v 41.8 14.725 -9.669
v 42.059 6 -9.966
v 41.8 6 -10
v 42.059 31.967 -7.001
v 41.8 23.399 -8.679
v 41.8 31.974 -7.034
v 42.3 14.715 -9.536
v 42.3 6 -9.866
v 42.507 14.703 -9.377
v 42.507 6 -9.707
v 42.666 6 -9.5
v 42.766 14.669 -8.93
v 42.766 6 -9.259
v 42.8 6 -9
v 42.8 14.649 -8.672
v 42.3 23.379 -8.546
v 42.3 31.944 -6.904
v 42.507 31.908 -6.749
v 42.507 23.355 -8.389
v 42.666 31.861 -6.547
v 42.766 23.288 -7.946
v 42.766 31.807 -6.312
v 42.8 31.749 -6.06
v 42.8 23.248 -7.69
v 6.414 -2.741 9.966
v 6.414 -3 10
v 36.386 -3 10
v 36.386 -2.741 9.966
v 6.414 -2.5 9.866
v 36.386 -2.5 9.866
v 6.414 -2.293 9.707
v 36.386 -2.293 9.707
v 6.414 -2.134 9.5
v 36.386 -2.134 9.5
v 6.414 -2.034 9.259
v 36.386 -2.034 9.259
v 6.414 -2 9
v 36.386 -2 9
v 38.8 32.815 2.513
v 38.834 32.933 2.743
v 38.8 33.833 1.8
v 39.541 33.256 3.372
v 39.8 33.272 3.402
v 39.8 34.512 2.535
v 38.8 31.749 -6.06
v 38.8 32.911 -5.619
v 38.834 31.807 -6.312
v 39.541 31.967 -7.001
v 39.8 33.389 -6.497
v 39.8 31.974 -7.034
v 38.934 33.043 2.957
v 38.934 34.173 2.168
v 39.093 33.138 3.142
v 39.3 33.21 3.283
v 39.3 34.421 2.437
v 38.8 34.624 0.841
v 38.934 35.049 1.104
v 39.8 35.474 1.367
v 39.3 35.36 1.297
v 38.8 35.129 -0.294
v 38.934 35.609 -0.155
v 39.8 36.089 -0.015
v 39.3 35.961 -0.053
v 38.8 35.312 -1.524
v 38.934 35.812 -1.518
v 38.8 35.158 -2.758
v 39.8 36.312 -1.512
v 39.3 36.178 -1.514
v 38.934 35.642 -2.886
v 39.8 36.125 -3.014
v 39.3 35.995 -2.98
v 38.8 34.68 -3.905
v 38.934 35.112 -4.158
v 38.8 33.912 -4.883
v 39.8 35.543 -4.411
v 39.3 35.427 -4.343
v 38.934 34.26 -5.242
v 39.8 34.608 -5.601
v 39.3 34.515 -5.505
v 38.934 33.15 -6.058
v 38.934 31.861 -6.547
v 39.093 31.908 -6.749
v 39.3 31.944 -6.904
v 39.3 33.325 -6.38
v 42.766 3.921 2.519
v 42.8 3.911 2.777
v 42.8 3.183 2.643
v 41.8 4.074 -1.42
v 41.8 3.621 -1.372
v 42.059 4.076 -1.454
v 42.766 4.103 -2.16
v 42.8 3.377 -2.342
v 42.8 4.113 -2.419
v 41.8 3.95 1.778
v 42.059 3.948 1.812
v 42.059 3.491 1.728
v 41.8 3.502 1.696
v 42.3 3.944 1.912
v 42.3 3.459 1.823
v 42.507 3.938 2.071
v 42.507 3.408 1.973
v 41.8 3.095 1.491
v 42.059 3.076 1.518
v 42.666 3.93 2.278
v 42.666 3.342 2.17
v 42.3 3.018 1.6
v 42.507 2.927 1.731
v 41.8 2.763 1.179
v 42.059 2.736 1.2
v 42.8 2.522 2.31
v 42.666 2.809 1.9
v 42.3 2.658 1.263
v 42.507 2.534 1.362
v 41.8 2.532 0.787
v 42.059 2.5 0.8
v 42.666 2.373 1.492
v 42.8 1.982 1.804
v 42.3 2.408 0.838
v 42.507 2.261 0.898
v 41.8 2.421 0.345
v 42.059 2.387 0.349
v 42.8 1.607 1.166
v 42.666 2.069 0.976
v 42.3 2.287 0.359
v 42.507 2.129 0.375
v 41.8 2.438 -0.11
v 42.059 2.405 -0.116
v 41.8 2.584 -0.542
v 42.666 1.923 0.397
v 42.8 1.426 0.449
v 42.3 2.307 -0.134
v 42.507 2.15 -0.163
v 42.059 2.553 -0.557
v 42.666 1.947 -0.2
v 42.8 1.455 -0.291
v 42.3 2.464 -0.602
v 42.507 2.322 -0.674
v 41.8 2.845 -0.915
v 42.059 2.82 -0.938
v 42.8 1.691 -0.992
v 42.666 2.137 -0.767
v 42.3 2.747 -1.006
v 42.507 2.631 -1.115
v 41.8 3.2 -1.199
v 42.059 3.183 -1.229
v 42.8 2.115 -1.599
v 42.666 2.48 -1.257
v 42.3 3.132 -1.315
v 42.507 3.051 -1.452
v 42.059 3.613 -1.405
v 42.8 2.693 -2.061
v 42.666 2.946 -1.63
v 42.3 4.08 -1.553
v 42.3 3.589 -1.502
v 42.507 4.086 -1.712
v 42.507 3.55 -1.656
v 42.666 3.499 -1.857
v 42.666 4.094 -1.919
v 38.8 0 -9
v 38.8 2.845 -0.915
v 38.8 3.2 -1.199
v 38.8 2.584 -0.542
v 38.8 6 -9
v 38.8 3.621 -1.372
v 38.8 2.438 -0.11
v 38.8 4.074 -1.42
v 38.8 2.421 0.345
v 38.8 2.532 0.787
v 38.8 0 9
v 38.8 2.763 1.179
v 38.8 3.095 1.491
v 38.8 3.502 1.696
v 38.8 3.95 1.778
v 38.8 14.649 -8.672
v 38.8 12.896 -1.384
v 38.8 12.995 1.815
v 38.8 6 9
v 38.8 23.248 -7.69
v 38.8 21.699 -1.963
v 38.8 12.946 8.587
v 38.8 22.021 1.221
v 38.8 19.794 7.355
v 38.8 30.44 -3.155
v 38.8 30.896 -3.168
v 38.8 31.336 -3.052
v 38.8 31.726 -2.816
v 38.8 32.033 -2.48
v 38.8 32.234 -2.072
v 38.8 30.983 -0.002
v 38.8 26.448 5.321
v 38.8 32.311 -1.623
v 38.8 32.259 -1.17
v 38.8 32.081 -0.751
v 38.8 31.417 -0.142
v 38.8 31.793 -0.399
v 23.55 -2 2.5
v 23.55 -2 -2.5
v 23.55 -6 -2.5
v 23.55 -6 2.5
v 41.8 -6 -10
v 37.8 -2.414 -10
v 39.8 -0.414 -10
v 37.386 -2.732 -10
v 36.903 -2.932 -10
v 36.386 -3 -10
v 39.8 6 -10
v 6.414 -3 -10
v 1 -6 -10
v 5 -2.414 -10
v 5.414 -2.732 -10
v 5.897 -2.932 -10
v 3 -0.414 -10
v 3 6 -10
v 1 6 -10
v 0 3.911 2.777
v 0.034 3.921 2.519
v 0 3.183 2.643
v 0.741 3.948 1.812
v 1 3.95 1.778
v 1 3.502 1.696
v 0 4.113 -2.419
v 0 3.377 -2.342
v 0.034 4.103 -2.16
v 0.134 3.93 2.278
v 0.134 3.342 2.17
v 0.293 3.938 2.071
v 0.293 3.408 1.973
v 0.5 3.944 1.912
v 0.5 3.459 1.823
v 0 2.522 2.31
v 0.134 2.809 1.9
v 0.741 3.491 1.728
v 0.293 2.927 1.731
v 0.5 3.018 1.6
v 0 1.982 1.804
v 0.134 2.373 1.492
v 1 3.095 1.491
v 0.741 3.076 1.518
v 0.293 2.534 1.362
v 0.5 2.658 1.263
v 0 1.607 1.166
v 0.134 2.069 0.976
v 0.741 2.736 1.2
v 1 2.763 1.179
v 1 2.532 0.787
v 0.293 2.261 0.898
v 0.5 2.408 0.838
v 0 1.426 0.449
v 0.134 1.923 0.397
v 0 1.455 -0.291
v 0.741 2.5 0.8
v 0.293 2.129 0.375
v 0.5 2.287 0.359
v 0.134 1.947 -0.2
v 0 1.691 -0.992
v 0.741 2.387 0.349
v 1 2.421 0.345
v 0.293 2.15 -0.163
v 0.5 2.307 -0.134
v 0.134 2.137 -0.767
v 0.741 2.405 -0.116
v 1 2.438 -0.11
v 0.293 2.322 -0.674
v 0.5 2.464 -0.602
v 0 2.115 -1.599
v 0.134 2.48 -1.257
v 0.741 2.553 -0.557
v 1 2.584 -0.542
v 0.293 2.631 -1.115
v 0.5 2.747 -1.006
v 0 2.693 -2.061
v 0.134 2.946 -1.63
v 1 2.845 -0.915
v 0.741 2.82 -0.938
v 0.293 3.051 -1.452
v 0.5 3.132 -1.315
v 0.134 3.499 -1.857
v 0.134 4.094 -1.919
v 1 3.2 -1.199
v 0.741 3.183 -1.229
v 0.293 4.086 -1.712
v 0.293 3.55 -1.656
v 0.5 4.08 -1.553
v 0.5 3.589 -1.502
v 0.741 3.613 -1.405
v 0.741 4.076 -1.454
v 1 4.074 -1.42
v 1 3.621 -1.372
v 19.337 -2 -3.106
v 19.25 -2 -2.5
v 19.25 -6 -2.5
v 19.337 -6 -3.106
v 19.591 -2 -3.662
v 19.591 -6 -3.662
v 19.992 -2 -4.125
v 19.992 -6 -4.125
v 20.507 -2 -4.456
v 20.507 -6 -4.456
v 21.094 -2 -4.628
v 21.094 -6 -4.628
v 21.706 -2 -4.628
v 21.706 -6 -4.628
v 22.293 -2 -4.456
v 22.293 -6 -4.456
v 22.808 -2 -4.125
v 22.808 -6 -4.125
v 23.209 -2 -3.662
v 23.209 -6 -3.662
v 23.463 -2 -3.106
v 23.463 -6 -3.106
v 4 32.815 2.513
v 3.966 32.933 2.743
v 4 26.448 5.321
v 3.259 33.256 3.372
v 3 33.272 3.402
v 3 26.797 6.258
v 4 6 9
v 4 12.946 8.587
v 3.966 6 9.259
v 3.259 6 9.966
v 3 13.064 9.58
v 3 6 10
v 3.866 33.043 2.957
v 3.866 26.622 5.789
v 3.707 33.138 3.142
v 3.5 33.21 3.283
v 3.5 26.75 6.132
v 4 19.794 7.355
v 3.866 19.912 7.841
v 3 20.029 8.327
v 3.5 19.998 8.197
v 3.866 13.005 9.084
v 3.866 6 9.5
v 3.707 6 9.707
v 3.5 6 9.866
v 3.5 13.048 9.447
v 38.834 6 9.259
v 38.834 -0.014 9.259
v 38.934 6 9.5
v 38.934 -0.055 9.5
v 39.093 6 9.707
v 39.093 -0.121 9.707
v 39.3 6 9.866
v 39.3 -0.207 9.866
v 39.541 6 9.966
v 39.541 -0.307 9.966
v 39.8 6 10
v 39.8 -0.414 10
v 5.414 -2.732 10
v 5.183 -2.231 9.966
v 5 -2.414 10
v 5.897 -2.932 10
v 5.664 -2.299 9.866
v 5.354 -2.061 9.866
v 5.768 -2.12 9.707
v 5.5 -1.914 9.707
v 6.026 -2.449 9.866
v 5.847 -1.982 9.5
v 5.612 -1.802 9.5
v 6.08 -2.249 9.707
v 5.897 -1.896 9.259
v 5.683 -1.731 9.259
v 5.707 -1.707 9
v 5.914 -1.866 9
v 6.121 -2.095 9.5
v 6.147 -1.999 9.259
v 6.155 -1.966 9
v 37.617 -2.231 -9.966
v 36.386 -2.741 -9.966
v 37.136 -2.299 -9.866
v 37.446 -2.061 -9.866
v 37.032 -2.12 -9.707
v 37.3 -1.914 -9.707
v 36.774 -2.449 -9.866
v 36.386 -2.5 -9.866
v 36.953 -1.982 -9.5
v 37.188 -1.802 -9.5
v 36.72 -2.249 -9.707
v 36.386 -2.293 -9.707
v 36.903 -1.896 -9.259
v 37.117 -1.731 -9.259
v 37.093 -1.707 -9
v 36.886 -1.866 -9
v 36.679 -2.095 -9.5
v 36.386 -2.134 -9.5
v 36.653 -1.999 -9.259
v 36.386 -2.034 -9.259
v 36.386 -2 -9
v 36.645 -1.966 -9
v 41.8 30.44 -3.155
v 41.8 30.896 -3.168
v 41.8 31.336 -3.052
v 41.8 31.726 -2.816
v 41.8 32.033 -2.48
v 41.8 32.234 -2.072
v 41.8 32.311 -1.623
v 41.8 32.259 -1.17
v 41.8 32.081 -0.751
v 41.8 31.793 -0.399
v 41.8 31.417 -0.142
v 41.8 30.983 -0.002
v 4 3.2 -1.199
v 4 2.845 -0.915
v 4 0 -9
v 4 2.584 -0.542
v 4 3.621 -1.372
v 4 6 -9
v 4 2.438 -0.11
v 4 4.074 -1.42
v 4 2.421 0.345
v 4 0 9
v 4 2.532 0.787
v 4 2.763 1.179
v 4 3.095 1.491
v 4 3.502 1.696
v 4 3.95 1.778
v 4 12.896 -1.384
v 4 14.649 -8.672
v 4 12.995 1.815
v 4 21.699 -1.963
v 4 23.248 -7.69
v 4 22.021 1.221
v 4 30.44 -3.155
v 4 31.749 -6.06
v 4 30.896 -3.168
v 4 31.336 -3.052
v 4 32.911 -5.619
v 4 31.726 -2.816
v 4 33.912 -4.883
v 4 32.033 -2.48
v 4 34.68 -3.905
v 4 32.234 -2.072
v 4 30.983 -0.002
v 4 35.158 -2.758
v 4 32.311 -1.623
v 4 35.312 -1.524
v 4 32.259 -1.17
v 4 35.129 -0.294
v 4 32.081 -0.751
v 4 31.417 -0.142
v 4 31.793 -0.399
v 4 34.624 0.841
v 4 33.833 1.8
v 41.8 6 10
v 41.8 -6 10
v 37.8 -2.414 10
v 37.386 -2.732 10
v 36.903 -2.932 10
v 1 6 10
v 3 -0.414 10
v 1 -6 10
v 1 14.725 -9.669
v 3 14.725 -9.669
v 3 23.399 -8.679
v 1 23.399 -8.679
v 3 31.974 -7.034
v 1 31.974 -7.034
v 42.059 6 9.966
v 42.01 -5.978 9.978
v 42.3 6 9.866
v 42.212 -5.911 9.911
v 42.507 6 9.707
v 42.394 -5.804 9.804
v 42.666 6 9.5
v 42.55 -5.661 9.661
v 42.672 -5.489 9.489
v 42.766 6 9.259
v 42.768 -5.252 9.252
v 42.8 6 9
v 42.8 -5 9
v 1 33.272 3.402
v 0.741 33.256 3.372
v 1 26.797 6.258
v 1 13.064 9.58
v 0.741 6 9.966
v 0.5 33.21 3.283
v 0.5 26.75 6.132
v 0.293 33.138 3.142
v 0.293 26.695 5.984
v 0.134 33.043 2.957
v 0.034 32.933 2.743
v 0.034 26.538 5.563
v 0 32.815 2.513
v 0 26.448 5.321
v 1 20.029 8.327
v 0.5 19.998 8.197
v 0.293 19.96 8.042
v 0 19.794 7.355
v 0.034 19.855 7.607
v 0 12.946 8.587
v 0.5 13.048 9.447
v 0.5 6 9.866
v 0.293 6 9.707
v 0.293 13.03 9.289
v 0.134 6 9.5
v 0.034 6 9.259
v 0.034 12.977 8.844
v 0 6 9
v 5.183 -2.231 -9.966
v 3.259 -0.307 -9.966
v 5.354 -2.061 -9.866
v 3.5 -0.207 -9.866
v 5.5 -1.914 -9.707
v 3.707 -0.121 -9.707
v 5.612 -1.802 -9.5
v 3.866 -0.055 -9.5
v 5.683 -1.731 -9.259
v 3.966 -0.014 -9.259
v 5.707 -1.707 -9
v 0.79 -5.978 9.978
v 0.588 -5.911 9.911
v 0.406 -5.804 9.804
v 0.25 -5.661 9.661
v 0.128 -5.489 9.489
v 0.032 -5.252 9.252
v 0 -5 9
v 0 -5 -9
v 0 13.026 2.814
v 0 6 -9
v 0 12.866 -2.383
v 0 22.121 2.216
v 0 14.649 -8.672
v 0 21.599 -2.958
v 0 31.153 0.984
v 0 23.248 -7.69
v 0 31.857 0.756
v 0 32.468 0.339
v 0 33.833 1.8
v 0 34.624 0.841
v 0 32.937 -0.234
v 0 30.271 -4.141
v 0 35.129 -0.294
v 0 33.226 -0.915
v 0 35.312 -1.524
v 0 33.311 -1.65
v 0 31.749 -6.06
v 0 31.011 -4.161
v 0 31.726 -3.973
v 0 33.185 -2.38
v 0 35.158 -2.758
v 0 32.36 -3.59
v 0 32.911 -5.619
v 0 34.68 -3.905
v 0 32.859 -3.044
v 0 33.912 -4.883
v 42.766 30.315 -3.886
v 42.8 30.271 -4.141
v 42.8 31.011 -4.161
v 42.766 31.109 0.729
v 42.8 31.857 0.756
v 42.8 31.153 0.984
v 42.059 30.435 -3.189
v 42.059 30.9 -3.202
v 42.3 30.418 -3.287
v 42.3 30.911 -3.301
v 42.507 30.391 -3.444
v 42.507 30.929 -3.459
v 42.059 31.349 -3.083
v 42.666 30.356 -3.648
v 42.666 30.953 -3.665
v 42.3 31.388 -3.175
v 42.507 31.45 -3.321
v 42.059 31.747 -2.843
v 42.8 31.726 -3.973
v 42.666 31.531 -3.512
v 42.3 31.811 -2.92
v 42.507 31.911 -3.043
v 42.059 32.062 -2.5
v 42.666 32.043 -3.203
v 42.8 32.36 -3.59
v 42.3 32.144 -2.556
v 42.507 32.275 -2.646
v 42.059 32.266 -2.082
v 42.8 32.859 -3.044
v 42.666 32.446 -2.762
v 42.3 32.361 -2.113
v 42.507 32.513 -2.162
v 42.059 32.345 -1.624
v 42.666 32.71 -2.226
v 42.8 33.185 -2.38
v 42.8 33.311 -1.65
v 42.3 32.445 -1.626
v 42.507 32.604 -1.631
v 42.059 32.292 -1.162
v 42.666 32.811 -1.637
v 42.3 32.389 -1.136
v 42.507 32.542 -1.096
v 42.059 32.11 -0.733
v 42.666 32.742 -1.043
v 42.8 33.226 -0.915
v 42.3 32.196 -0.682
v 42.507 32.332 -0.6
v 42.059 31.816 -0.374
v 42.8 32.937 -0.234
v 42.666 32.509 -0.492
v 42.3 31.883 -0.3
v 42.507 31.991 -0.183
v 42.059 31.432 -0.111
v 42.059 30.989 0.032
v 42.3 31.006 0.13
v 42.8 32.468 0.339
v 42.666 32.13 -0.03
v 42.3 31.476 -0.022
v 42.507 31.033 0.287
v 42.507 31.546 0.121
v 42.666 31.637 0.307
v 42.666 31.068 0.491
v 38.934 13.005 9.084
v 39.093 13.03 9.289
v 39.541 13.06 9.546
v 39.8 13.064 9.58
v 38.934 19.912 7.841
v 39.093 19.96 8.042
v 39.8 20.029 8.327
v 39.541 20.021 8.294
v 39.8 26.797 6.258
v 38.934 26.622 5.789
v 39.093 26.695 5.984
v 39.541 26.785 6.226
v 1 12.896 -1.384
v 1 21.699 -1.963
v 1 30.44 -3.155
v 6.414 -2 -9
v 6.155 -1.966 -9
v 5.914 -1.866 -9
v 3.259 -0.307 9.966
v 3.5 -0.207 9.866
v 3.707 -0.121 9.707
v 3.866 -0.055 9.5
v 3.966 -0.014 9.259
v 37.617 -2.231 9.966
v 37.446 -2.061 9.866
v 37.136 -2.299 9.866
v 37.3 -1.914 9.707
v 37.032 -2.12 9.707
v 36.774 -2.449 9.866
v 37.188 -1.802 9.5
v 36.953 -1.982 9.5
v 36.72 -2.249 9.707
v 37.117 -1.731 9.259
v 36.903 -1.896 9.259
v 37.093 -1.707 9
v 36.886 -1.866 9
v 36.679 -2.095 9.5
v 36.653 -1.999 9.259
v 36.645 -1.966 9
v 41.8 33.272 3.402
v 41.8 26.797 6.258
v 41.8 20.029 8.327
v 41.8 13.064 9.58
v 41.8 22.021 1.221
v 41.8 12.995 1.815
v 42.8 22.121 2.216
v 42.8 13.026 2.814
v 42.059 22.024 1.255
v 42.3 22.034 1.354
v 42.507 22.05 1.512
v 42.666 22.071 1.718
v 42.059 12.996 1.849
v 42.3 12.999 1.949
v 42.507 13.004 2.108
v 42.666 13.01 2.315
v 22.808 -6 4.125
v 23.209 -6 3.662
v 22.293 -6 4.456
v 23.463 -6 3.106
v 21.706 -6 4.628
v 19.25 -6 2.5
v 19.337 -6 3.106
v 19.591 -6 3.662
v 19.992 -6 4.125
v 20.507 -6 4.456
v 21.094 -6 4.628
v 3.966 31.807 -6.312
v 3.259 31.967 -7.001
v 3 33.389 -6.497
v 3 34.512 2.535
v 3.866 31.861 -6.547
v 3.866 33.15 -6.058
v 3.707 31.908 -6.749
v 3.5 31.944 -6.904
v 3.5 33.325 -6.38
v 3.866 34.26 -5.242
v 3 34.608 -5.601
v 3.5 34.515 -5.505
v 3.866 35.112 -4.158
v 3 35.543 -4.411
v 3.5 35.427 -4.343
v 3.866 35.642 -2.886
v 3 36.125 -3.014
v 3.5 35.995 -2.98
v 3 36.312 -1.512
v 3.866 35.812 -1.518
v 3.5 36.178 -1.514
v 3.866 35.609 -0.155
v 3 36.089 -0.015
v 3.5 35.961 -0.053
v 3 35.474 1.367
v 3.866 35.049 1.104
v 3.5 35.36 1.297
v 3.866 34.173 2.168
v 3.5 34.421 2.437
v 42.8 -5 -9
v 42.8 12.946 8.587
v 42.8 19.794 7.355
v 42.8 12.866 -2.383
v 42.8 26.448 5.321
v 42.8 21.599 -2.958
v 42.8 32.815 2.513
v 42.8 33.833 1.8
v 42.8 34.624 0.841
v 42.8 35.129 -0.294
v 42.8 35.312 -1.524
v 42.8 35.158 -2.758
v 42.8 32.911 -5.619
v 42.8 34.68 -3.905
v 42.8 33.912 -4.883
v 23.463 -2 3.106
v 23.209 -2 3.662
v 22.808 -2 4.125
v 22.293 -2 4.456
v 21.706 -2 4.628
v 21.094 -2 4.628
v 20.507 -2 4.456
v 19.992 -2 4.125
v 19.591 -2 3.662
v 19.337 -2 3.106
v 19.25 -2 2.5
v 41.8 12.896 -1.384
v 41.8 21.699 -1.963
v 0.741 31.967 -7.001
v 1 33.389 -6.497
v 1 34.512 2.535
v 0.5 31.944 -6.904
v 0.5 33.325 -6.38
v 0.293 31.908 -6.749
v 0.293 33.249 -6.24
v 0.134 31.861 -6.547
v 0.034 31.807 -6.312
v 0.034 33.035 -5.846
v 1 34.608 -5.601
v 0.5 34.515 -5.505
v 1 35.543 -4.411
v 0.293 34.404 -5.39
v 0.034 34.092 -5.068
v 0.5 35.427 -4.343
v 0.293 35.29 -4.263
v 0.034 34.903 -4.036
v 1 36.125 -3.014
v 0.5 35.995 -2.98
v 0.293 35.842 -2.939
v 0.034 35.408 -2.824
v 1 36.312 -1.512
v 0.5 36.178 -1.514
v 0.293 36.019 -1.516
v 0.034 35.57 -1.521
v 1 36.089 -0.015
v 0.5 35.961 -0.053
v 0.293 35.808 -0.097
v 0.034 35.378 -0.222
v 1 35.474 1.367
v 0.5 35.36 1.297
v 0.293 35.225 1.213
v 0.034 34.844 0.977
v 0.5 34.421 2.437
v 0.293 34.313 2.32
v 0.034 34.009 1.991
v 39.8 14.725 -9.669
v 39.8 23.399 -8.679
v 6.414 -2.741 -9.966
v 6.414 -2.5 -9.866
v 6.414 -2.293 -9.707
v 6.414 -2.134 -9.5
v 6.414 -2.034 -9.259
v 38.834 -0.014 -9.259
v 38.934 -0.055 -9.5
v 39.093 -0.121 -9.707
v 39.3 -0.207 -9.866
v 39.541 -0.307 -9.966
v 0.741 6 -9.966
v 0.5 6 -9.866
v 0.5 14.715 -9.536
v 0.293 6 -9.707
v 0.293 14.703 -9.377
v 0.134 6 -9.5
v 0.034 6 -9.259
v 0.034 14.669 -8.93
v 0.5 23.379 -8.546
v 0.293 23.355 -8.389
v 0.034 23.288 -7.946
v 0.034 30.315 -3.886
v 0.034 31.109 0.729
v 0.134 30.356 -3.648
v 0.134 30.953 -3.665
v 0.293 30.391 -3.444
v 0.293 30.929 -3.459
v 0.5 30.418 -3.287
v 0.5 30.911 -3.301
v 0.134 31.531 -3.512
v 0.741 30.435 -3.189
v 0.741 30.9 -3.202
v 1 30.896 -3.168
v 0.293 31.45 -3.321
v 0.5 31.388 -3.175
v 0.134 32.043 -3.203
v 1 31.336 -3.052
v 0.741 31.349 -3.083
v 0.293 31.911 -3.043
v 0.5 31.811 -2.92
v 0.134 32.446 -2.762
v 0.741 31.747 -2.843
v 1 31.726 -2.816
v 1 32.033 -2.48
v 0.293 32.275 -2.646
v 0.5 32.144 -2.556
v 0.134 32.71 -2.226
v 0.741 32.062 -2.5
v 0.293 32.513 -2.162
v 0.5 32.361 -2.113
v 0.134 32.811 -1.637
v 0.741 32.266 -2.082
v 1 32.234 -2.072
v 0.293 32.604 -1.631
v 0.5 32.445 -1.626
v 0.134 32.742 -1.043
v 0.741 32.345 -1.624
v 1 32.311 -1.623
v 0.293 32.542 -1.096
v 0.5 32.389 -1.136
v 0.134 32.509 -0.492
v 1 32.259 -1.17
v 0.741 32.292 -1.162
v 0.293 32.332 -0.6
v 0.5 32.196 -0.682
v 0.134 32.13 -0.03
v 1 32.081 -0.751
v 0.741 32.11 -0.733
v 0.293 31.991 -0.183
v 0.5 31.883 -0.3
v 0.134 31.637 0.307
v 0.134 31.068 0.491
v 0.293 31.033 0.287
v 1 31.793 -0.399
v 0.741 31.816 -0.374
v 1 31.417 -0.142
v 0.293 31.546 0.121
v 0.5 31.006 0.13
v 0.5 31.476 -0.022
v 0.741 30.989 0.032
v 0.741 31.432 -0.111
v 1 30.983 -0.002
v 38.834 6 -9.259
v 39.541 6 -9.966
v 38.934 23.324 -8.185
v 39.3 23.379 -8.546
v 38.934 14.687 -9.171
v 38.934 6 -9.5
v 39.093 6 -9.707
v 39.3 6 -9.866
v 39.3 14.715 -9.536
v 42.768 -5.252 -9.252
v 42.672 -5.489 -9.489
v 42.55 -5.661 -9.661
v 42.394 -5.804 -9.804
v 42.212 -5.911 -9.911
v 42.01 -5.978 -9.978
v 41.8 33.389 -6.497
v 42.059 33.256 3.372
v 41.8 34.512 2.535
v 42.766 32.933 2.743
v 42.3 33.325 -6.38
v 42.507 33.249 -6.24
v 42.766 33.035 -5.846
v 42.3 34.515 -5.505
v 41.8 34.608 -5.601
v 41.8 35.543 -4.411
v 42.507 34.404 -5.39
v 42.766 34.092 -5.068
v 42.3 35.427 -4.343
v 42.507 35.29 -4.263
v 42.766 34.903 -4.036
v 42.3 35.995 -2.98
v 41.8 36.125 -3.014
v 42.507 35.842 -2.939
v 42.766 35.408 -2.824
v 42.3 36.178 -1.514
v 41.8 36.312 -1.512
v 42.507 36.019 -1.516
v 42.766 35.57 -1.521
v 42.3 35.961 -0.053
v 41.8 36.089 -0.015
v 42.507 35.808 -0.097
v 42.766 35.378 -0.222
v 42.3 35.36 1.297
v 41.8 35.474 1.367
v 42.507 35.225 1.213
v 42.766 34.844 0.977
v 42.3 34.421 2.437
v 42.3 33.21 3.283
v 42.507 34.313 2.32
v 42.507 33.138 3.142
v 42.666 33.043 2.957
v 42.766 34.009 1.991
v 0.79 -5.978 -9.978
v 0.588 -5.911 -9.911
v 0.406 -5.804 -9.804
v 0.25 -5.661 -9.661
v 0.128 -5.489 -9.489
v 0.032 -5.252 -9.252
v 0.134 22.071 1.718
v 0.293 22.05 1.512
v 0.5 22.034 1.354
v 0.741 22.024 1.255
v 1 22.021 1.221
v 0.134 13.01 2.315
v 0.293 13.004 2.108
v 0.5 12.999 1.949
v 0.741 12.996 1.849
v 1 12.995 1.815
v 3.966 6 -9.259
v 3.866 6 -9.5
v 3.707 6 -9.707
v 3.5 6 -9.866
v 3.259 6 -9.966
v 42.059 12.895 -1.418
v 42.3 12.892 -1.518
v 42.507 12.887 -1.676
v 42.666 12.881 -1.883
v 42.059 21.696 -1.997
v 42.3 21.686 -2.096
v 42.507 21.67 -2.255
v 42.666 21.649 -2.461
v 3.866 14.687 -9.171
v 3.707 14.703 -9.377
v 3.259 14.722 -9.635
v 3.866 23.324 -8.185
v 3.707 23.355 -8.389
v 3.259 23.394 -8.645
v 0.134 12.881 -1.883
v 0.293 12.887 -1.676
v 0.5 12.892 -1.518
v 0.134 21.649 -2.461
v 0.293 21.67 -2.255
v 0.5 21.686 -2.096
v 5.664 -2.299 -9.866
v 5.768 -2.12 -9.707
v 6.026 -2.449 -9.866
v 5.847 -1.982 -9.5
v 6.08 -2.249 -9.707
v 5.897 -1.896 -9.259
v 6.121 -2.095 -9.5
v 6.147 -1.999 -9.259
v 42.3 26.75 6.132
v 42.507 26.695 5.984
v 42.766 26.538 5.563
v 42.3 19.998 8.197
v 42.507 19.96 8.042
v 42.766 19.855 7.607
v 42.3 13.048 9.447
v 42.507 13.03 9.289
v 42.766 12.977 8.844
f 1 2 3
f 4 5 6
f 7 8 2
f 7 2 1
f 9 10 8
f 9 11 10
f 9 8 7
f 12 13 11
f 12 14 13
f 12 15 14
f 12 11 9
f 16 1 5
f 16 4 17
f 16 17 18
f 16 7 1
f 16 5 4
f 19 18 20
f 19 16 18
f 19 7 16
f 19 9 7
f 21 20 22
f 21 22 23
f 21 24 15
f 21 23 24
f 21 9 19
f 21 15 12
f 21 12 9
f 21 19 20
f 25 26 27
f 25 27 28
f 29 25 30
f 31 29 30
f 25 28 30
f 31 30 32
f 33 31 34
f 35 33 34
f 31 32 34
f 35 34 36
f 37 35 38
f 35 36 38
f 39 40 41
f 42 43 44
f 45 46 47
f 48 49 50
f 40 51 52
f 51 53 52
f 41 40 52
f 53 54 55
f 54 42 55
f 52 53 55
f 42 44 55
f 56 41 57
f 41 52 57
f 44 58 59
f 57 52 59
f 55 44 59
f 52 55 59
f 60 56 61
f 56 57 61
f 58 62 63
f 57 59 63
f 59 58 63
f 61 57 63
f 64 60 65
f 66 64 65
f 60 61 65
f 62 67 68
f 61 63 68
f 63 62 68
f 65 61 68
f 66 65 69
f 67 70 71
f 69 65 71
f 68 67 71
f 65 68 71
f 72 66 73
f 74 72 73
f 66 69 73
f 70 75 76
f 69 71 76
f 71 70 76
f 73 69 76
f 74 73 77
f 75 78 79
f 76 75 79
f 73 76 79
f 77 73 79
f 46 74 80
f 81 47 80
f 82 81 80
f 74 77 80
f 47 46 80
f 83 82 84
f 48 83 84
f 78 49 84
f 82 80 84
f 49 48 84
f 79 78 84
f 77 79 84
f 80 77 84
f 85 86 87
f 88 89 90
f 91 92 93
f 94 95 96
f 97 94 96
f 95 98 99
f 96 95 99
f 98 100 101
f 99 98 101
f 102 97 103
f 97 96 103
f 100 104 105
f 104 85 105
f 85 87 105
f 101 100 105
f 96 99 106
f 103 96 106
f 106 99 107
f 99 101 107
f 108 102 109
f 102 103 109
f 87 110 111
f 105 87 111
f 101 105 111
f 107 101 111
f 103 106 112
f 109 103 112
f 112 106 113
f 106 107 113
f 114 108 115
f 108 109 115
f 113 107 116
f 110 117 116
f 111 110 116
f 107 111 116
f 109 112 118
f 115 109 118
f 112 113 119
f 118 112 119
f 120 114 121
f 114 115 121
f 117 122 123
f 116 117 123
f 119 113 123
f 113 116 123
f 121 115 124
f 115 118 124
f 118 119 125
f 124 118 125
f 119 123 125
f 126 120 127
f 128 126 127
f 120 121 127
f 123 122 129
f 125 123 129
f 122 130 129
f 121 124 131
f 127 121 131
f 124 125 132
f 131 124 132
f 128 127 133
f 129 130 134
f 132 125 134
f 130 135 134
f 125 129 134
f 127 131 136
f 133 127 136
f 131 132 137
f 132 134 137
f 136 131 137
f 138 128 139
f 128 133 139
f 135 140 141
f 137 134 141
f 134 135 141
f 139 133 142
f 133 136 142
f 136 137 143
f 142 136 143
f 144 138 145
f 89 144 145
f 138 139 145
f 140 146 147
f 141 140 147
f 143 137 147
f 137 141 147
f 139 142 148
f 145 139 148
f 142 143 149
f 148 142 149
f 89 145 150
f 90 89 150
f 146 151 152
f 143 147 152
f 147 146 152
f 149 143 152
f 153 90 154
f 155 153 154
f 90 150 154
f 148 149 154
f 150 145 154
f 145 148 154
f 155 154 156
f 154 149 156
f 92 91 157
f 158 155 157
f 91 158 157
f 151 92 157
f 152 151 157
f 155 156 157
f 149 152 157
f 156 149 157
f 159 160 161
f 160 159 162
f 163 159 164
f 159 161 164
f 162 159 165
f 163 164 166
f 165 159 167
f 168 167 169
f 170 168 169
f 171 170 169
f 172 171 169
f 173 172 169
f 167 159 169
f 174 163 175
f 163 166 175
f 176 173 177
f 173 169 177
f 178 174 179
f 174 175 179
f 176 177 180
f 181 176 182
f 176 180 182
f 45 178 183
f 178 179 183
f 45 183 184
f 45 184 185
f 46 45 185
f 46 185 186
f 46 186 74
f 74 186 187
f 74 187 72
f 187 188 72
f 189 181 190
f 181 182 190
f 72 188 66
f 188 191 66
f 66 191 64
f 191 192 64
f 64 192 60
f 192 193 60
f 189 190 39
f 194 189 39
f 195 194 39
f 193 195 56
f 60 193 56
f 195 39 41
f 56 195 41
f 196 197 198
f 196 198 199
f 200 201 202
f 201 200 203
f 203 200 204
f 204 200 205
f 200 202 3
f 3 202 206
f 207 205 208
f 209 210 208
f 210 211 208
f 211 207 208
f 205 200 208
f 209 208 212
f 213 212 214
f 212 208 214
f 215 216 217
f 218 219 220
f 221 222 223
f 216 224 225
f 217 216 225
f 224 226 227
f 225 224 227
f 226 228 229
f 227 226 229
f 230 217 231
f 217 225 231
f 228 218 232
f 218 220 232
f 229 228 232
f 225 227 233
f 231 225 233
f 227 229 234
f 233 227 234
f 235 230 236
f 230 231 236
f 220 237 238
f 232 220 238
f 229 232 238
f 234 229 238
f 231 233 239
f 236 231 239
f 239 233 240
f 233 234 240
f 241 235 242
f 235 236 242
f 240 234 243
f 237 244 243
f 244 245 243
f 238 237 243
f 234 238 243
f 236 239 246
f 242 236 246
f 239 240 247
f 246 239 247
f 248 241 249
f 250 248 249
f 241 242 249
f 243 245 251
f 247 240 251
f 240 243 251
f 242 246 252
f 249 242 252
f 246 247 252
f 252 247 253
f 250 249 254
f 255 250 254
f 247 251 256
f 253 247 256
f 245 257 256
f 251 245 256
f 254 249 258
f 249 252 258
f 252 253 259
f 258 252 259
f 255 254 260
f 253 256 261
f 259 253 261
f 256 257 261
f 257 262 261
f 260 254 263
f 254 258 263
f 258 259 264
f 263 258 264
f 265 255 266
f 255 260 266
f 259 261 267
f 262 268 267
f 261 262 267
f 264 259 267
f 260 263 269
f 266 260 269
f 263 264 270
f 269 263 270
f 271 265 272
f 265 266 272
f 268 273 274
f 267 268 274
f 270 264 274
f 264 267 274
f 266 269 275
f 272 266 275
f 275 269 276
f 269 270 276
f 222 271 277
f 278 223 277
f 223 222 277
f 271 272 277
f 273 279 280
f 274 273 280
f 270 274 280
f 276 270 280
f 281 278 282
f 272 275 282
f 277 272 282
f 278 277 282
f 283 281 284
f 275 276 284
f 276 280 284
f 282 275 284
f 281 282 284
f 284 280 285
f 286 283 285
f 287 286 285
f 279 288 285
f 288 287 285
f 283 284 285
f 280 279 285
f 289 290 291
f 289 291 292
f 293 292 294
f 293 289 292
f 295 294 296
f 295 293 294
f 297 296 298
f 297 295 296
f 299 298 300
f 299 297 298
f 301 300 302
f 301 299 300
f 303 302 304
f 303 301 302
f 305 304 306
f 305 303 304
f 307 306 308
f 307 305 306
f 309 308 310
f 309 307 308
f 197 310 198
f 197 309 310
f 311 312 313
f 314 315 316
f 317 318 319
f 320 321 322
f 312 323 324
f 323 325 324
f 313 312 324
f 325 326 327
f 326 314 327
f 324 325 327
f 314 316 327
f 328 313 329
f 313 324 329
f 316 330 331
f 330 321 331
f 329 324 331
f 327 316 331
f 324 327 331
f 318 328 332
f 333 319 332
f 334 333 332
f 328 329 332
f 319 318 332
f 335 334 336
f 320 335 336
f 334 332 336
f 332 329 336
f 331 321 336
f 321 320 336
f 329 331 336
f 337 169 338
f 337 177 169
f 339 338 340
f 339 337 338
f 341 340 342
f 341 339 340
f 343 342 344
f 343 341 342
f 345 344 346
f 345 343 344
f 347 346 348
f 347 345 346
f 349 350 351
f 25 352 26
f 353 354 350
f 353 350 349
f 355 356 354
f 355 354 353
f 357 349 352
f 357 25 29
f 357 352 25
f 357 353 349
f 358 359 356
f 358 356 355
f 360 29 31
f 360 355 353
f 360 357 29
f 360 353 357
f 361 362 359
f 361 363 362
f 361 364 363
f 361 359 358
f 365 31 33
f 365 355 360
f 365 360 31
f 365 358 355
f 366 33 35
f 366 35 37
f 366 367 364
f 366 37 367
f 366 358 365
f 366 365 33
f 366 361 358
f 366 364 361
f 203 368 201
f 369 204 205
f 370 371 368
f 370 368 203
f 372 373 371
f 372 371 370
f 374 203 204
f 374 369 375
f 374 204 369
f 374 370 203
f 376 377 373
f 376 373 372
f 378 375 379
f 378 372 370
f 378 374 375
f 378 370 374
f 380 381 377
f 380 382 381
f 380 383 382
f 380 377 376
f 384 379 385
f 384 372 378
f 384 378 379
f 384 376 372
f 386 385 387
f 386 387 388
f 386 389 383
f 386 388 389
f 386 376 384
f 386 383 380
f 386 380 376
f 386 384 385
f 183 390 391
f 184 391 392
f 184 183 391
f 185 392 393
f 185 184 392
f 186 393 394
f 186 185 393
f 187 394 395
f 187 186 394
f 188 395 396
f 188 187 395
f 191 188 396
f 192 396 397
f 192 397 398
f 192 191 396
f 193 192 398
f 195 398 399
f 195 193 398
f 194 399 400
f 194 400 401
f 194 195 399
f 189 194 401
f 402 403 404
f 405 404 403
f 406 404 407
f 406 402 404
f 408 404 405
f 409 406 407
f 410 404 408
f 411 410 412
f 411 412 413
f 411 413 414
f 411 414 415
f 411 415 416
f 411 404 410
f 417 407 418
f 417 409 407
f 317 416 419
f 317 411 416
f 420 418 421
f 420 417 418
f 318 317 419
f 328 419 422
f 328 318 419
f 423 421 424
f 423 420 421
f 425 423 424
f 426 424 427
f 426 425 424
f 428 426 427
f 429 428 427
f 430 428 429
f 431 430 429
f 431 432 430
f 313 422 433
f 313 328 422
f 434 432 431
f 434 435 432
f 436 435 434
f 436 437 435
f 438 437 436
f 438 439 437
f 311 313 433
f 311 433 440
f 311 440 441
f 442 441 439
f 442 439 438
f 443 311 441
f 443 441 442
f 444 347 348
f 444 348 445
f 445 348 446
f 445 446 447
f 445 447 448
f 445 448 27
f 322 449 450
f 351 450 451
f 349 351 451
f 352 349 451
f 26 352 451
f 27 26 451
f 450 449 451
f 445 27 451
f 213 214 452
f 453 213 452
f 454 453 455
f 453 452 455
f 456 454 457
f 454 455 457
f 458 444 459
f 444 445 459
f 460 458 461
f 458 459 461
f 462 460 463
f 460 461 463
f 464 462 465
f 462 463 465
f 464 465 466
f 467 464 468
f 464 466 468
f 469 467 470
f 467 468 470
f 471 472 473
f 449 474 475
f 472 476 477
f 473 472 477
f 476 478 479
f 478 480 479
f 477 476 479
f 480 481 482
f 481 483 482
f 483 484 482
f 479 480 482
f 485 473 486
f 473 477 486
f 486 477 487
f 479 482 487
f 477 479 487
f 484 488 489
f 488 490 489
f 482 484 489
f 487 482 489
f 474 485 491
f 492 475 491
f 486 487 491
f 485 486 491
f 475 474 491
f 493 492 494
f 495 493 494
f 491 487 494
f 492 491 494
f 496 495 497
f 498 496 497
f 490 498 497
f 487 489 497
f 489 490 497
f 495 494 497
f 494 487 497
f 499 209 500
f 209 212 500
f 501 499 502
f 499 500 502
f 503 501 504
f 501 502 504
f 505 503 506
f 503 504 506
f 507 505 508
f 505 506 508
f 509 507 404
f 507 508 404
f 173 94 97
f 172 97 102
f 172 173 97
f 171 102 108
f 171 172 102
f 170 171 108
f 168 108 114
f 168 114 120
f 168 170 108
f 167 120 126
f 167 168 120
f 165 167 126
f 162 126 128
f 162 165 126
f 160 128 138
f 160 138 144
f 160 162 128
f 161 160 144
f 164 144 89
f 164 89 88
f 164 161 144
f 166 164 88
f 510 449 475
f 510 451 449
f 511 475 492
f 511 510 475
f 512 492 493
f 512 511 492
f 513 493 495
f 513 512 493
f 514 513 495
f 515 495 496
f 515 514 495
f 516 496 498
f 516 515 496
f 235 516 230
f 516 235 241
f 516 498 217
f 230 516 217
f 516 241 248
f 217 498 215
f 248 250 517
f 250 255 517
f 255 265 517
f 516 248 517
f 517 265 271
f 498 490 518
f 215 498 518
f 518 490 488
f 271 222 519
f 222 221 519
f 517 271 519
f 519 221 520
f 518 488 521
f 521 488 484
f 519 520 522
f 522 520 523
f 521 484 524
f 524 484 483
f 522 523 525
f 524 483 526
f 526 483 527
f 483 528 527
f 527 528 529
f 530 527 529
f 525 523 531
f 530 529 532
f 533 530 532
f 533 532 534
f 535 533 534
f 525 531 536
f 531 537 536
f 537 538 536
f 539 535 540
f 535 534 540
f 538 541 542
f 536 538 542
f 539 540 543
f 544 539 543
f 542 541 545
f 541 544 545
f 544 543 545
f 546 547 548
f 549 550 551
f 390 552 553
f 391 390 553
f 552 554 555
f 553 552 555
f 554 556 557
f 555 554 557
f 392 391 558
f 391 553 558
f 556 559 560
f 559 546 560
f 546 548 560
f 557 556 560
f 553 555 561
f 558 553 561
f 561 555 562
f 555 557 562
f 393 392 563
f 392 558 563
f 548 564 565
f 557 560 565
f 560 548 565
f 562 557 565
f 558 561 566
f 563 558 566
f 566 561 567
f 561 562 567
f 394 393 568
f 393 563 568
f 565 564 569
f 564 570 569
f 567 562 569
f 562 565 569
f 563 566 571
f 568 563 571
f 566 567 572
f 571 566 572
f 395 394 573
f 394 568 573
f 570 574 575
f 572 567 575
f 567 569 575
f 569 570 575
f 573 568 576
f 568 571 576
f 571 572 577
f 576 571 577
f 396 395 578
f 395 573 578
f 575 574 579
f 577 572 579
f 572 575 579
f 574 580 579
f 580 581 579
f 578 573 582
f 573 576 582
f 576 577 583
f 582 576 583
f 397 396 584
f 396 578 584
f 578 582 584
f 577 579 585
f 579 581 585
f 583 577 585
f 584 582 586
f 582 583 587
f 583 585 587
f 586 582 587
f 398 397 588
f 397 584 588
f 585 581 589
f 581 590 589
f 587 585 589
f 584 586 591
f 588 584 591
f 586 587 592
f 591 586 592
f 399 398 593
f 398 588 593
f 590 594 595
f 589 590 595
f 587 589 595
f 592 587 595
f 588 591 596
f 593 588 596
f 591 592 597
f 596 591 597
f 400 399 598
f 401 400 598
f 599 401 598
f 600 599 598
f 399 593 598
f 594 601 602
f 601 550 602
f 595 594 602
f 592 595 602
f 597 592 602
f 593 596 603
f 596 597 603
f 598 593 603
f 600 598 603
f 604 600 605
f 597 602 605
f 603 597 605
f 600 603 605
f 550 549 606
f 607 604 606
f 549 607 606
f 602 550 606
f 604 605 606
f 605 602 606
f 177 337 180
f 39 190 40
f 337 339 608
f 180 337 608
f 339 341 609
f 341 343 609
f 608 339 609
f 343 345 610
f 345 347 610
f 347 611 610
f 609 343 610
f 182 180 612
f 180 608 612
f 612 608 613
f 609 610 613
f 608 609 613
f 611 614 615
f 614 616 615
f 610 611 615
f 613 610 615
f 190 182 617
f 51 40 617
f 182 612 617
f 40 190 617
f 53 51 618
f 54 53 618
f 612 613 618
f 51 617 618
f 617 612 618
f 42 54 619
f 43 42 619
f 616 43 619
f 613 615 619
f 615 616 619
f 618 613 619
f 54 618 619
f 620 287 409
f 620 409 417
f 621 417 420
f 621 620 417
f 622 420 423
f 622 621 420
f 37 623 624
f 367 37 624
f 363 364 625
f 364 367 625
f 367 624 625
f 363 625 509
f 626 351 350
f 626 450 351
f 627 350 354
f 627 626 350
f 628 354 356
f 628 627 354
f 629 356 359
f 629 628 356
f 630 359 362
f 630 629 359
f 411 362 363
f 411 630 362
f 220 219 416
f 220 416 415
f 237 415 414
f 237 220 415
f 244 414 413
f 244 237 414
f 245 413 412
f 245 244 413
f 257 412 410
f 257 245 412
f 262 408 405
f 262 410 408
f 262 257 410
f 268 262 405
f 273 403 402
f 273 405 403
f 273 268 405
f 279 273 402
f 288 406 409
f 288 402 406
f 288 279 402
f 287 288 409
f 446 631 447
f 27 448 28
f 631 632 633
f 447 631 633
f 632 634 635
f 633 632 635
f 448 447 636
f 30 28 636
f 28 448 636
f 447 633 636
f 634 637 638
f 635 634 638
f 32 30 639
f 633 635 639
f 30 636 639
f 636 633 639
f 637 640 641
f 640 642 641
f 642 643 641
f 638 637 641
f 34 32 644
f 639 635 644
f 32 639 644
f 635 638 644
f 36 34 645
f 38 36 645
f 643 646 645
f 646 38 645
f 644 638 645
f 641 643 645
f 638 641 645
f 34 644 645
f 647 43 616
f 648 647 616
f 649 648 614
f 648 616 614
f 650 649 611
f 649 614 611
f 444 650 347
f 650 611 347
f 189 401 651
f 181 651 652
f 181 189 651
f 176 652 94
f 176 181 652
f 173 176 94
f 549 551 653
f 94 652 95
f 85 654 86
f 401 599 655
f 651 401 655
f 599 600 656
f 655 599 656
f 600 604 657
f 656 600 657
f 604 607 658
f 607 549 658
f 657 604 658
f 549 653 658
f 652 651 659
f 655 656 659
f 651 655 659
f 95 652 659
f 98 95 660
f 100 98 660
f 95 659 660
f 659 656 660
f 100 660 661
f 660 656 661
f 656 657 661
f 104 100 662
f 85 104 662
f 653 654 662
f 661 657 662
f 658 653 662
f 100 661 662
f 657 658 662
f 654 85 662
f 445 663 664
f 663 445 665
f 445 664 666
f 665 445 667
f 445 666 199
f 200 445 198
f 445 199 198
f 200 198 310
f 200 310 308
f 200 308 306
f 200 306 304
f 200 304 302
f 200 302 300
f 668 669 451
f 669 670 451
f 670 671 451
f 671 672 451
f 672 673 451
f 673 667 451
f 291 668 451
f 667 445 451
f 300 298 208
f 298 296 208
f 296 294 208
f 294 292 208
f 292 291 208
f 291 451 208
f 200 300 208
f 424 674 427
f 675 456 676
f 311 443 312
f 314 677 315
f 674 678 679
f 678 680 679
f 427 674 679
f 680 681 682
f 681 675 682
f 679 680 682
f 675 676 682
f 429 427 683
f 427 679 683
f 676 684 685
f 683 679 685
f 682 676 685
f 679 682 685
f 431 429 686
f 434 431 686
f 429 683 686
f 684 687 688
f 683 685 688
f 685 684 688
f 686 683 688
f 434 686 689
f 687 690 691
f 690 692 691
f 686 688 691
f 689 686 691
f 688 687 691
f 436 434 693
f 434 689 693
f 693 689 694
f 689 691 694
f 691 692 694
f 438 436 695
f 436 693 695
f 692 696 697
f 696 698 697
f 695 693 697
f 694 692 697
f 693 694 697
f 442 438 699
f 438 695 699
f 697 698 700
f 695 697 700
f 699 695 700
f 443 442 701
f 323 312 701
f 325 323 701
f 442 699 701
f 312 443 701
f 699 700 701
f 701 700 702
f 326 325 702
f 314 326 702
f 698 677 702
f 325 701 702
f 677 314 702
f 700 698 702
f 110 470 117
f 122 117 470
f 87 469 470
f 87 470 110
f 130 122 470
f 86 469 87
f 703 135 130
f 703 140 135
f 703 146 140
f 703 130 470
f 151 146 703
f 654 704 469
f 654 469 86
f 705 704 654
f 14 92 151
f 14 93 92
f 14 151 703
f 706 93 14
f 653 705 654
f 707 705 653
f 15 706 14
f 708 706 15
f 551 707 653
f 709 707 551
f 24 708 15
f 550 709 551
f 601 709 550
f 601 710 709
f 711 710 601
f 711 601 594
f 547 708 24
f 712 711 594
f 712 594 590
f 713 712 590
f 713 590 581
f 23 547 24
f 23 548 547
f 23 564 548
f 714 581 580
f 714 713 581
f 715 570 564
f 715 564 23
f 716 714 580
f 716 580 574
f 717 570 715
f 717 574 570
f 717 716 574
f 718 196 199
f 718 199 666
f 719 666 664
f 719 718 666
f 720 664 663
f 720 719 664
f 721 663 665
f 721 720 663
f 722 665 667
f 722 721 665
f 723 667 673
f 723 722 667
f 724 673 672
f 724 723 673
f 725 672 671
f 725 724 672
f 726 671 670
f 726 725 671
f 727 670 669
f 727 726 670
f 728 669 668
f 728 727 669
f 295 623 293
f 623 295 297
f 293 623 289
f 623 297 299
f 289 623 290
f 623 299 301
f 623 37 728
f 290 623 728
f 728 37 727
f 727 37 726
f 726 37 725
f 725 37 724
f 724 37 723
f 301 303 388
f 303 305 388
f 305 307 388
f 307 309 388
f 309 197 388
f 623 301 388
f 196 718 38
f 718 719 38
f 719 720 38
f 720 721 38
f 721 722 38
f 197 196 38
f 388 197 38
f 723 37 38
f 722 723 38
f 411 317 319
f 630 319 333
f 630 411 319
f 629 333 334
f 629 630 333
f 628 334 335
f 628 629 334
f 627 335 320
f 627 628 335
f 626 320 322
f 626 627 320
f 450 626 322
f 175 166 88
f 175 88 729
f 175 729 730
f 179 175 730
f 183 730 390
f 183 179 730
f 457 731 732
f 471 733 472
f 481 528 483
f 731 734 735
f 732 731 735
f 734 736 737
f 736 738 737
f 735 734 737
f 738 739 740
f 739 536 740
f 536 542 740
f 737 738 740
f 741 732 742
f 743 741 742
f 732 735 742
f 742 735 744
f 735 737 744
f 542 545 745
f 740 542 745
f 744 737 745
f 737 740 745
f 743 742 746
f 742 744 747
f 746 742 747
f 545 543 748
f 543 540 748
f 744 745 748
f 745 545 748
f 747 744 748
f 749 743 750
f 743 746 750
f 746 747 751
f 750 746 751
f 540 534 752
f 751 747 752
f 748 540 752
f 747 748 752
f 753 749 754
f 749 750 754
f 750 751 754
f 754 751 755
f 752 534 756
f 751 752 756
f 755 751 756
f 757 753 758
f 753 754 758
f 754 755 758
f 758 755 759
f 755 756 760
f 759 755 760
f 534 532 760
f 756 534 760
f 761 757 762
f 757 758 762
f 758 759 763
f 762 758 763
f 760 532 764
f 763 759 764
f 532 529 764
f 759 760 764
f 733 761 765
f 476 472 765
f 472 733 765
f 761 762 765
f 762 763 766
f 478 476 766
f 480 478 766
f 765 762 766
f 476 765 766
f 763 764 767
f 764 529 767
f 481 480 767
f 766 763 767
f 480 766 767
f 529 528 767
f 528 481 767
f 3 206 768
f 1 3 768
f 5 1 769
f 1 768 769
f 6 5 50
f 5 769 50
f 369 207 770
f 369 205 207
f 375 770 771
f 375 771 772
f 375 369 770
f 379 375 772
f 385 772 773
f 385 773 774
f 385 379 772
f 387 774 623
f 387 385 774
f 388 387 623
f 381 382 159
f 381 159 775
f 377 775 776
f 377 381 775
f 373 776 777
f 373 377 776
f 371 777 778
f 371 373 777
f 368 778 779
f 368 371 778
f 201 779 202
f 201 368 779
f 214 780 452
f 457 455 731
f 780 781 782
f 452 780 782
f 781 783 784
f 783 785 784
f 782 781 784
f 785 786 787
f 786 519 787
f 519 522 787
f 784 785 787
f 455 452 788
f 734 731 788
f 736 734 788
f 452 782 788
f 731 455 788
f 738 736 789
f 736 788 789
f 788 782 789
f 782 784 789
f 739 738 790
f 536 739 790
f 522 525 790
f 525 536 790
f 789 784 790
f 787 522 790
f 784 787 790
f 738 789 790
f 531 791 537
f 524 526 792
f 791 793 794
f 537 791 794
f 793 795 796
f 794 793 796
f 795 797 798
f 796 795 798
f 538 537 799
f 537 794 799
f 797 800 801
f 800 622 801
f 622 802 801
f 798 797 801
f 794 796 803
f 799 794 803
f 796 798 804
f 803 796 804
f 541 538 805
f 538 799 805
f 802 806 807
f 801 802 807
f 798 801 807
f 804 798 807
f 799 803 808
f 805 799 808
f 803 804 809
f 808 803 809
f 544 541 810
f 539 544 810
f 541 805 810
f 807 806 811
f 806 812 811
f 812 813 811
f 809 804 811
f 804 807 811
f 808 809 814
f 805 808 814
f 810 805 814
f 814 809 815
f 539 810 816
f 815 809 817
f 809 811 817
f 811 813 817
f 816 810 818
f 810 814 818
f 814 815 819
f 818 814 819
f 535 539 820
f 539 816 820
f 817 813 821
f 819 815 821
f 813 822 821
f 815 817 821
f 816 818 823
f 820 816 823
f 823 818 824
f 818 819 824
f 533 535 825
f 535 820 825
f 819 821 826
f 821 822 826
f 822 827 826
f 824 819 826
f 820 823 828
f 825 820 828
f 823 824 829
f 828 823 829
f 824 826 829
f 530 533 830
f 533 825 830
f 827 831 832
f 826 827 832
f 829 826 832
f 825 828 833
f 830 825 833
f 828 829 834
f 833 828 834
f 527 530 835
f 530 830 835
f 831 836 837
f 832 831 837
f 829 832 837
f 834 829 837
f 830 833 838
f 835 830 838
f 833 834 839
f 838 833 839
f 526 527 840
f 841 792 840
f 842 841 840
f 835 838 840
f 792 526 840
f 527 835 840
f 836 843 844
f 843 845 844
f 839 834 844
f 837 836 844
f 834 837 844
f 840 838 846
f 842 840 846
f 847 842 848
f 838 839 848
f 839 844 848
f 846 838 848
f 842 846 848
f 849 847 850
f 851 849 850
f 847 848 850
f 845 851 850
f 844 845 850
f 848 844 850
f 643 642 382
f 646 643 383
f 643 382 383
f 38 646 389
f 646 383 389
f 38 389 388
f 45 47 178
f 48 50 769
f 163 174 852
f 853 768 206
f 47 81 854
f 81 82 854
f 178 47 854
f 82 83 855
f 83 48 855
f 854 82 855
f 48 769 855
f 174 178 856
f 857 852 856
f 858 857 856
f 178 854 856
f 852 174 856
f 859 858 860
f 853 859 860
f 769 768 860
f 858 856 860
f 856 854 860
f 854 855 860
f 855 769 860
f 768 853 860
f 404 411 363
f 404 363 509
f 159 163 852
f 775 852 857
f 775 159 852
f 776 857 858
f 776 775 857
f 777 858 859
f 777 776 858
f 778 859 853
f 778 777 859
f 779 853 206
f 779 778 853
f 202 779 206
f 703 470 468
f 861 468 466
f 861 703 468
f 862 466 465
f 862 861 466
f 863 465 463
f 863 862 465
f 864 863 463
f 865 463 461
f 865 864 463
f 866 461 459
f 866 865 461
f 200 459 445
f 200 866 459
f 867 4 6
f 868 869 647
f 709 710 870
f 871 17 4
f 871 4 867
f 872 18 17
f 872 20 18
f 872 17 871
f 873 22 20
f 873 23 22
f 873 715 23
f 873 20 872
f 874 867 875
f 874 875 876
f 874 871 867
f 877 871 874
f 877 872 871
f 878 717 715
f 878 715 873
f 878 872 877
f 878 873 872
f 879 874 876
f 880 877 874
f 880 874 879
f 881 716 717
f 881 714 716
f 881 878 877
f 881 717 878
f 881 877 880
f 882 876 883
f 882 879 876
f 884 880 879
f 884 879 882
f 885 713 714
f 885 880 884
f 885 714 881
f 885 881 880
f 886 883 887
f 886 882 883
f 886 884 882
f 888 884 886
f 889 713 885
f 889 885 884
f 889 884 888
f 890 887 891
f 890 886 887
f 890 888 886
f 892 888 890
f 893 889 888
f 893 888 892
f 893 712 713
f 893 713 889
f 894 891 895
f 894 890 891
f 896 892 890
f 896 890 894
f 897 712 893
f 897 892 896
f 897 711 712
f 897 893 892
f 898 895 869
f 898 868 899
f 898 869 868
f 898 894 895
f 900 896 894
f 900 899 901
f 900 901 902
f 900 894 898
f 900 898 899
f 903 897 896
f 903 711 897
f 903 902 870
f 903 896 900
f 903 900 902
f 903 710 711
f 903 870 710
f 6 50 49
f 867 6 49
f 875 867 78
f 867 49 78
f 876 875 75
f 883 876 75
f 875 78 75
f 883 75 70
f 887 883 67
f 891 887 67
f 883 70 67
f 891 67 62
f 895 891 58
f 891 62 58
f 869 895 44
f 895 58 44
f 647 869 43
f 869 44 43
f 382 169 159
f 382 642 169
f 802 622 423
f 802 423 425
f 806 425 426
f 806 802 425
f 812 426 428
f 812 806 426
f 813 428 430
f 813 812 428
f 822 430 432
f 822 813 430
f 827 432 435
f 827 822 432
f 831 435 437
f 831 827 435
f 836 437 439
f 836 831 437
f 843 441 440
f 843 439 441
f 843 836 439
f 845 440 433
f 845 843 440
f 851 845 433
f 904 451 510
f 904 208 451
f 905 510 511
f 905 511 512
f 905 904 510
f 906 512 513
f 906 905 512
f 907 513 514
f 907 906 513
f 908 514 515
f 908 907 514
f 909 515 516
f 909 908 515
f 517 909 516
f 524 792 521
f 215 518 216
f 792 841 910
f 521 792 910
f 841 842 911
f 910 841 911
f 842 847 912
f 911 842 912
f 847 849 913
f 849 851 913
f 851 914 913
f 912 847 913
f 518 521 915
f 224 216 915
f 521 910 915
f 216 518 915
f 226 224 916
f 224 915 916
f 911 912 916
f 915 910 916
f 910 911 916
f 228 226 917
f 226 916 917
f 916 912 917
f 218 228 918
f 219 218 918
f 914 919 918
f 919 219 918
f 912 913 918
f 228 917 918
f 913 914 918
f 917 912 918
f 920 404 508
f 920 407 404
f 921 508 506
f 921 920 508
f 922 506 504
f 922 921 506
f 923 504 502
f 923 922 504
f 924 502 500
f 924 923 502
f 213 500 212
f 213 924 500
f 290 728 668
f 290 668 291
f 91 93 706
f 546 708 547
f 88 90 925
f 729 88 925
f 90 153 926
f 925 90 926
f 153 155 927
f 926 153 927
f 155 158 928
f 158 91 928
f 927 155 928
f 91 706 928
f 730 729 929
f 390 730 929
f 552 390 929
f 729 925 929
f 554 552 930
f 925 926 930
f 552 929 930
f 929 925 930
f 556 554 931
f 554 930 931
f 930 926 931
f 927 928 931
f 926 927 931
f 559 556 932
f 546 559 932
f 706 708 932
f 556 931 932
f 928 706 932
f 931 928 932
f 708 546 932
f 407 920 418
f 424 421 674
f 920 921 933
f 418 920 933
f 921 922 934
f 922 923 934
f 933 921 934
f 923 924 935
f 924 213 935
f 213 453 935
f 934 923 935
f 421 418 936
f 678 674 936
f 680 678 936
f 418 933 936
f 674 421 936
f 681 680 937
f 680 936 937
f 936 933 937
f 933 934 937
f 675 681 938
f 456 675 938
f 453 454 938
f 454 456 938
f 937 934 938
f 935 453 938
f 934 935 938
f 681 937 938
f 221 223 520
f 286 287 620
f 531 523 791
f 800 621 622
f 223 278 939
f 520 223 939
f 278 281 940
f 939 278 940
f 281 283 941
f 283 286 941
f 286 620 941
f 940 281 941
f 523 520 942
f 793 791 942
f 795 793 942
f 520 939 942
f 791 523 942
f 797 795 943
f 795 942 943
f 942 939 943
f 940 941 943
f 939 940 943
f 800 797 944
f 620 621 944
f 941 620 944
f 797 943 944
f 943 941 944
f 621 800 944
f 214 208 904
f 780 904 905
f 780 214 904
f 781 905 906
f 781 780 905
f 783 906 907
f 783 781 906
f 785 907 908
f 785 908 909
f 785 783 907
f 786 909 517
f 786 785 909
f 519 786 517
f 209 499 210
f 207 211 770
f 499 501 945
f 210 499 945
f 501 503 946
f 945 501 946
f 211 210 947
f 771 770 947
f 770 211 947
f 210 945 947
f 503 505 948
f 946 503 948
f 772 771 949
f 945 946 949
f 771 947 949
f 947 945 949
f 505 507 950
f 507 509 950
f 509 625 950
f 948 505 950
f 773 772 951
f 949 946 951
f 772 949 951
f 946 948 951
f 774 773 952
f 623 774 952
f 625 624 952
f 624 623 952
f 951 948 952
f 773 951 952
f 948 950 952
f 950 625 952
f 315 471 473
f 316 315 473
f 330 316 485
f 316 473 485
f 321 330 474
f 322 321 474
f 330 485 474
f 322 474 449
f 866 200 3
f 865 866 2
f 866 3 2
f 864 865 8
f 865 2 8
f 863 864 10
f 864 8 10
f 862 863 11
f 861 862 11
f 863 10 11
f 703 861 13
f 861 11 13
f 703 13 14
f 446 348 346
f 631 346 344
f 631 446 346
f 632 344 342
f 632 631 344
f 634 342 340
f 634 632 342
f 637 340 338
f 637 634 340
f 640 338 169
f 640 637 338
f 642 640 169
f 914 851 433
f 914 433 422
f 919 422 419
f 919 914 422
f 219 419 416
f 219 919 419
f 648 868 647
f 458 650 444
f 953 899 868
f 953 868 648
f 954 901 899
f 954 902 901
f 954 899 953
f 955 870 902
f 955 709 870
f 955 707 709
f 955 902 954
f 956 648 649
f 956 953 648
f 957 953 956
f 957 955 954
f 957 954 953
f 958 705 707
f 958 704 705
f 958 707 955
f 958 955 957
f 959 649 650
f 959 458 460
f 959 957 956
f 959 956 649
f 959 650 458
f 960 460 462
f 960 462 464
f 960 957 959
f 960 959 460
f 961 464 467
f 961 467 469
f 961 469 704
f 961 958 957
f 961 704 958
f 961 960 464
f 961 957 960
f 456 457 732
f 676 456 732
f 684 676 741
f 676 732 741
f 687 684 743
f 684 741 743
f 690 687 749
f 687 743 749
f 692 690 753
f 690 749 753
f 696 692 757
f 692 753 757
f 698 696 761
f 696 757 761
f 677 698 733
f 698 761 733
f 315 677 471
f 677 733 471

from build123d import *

# Parameters (mm, degrees)
BOSS_EXTRUDE1_DEPTH = 42.8
SKETCH2_W           = 34.8
SKETCH2_H           = 38.311897311
CUT_EXTRUDE1_DEPTH  = 60.585181768
CHAMFER1_SIZE       = 2
FILLET1_R           = 1
CUT_EXTRUDE2_DEPTH  = 59.306444702


with BuildPart() as part:
    # Sketch1 → Boss-Extrude1 (new body)
    with BuildSketch(Plane(origin=(0, 0, 0), x_dir=(0, 0, -1), z_dir=(1, 0, 0))):
        with BuildLine():
            Line((-10, -6), (10, -6))
            Line((10, -6), (10, 6))
            ThreePointArc((10, 6), (9.25619767, 19.071476996), (7.034393072, 31.974202951))
            ThreePointArc((7.034393072, 31.974202951), (2.269388413, 36.269117533), (-3.402199146, 33.271676085))
            ThreePointArc((-3.402199146, 33.271676085), (-8.327095908, 20.029213205), (-10, 6))
            Line((-10, 6), (-10, -6))
        make_face()
        with BuildLine():
            ThreePointArc((0.001705571, 30.983312005), (-1.596543983, 17.513106187), (-1.778018244, 3.949628997))
            ThreePointArc((-1.778018244, 3.949628997), (-0.116879823, 2.413198345), (1.419550828, 4.074336766))
            ThreePointArc((1.419550828, 4.074336766), (1.596543983, 17.302893813), (3.15532829, 30.440482617))
            ThreePointArc((3.15532829, 30.440482617), (1.849931624, 32.288708671), (0.001705571, 30.983312005))
        make_face(mode=Mode.SUBTRACT)
    extrude(amount=BOSS_EXTRUDE1_DEPTH)

    # Sketch2 → Cut-Extrude1 (cut, through all)
    with BuildSketch(Plane.XY.offset(10)):
        with Locations((21.4, 17.155948656)):
            Rectangle(SKETCH2_W, SKETCH2_H)
    extrude(amount=-CUT_EXTRUDE1_DEPTH, mode=Mode.SUBTRACT)

    # Chamfer1
    chamfer1_edges = [part.edges().sort_by_distance(p)[0] for p in [
        (4, -2, 0),
        (38.8, -2, 0),
    ]]
    chamfer(chamfer1_edges, length=CHAMFER1_SIZE)

    # Fillet1
    fillet1_edges = [part.edges().sort_by_distance(p)[0] for p in [
        (42.8, 20.029213205, 8.327095908),
        (42.8, 0, 10),
        (42.8, -6, 0),
        (42.8, 0, -10),
        (0, 32.288708671, -1.849931624),
        (0, 17.513106187, 1.596543983),
        (0, 2.413198345, 0.116879823),
        (0, 17.302893813, -1.596543983),
        (42.8, 32.288708671, -1.849931624),
        (42.8, 17.513106187, 1.596543983),
        (42.8, 2.413198345, 0.116879823),
        (42.8, 17.302893813, -1.596543983),
        (42.8, 19.071476996, -9.25619767),
        (4, 36.269117533, -2.269388413),
        (4, 19.071476996, -9.25619767),
        (4, 3, -10),
        (4, 20.029213205, 8.327095908),
        (38.8, 19.071476996, -9.25619767),
        (38.8, 36.269117533, -2.269388413),
        (38.8, 20.029213205, 8.327095908),
        (4, 3, 10),
        (0, 0, -10),
        (0, -6, 0),
        (0, 0, 10),
        (42.8, 36.269117533, -2.269388413),
        (38.8, 3, -10),
        (38.8, 3, 10),
        (21.4, -2, 10),
        (0, 20.029213205, 8.327095908),
        (21.4, -2, -10),
        (6, -2, 0),
        (36.8, -2, 0),
        (37.8, -1, 10),
        (37.8, -1, -10),
        (5, -1, 10),
        (0, 36.269117533, -2.269388413),
        (5, -1, -10),
        (0, 19.071476996, -9.25619767),
    ]]
    fillet(fillet1_edges, radius=FILLET1_R)

    # Sketch3 → Cut-Extrude2 (cut, through all)
    with BuildSketch(Plane(origin=(0, -2, 0), x_dir=(1, 0, 0), z_dir=(0, 1, 0))):
        with BuildLine():
            Line((19.25, -2.5), (19.25, 2.5))
            ThreePointArc((19.25, 2.5), (21.4, 4.65), (23.55, 2.5))
            Line((23.55, 2.5), (23.55, -2.5))
            ThreePointArc((23.55, -2.5), (21.4, -4.65), (19.25, -2.5))
        make_face()
    extrude(amount=-CUT_EXTRUDE2_DEPTH, mode=Mode.SUBTRACT)


solid = part.part
